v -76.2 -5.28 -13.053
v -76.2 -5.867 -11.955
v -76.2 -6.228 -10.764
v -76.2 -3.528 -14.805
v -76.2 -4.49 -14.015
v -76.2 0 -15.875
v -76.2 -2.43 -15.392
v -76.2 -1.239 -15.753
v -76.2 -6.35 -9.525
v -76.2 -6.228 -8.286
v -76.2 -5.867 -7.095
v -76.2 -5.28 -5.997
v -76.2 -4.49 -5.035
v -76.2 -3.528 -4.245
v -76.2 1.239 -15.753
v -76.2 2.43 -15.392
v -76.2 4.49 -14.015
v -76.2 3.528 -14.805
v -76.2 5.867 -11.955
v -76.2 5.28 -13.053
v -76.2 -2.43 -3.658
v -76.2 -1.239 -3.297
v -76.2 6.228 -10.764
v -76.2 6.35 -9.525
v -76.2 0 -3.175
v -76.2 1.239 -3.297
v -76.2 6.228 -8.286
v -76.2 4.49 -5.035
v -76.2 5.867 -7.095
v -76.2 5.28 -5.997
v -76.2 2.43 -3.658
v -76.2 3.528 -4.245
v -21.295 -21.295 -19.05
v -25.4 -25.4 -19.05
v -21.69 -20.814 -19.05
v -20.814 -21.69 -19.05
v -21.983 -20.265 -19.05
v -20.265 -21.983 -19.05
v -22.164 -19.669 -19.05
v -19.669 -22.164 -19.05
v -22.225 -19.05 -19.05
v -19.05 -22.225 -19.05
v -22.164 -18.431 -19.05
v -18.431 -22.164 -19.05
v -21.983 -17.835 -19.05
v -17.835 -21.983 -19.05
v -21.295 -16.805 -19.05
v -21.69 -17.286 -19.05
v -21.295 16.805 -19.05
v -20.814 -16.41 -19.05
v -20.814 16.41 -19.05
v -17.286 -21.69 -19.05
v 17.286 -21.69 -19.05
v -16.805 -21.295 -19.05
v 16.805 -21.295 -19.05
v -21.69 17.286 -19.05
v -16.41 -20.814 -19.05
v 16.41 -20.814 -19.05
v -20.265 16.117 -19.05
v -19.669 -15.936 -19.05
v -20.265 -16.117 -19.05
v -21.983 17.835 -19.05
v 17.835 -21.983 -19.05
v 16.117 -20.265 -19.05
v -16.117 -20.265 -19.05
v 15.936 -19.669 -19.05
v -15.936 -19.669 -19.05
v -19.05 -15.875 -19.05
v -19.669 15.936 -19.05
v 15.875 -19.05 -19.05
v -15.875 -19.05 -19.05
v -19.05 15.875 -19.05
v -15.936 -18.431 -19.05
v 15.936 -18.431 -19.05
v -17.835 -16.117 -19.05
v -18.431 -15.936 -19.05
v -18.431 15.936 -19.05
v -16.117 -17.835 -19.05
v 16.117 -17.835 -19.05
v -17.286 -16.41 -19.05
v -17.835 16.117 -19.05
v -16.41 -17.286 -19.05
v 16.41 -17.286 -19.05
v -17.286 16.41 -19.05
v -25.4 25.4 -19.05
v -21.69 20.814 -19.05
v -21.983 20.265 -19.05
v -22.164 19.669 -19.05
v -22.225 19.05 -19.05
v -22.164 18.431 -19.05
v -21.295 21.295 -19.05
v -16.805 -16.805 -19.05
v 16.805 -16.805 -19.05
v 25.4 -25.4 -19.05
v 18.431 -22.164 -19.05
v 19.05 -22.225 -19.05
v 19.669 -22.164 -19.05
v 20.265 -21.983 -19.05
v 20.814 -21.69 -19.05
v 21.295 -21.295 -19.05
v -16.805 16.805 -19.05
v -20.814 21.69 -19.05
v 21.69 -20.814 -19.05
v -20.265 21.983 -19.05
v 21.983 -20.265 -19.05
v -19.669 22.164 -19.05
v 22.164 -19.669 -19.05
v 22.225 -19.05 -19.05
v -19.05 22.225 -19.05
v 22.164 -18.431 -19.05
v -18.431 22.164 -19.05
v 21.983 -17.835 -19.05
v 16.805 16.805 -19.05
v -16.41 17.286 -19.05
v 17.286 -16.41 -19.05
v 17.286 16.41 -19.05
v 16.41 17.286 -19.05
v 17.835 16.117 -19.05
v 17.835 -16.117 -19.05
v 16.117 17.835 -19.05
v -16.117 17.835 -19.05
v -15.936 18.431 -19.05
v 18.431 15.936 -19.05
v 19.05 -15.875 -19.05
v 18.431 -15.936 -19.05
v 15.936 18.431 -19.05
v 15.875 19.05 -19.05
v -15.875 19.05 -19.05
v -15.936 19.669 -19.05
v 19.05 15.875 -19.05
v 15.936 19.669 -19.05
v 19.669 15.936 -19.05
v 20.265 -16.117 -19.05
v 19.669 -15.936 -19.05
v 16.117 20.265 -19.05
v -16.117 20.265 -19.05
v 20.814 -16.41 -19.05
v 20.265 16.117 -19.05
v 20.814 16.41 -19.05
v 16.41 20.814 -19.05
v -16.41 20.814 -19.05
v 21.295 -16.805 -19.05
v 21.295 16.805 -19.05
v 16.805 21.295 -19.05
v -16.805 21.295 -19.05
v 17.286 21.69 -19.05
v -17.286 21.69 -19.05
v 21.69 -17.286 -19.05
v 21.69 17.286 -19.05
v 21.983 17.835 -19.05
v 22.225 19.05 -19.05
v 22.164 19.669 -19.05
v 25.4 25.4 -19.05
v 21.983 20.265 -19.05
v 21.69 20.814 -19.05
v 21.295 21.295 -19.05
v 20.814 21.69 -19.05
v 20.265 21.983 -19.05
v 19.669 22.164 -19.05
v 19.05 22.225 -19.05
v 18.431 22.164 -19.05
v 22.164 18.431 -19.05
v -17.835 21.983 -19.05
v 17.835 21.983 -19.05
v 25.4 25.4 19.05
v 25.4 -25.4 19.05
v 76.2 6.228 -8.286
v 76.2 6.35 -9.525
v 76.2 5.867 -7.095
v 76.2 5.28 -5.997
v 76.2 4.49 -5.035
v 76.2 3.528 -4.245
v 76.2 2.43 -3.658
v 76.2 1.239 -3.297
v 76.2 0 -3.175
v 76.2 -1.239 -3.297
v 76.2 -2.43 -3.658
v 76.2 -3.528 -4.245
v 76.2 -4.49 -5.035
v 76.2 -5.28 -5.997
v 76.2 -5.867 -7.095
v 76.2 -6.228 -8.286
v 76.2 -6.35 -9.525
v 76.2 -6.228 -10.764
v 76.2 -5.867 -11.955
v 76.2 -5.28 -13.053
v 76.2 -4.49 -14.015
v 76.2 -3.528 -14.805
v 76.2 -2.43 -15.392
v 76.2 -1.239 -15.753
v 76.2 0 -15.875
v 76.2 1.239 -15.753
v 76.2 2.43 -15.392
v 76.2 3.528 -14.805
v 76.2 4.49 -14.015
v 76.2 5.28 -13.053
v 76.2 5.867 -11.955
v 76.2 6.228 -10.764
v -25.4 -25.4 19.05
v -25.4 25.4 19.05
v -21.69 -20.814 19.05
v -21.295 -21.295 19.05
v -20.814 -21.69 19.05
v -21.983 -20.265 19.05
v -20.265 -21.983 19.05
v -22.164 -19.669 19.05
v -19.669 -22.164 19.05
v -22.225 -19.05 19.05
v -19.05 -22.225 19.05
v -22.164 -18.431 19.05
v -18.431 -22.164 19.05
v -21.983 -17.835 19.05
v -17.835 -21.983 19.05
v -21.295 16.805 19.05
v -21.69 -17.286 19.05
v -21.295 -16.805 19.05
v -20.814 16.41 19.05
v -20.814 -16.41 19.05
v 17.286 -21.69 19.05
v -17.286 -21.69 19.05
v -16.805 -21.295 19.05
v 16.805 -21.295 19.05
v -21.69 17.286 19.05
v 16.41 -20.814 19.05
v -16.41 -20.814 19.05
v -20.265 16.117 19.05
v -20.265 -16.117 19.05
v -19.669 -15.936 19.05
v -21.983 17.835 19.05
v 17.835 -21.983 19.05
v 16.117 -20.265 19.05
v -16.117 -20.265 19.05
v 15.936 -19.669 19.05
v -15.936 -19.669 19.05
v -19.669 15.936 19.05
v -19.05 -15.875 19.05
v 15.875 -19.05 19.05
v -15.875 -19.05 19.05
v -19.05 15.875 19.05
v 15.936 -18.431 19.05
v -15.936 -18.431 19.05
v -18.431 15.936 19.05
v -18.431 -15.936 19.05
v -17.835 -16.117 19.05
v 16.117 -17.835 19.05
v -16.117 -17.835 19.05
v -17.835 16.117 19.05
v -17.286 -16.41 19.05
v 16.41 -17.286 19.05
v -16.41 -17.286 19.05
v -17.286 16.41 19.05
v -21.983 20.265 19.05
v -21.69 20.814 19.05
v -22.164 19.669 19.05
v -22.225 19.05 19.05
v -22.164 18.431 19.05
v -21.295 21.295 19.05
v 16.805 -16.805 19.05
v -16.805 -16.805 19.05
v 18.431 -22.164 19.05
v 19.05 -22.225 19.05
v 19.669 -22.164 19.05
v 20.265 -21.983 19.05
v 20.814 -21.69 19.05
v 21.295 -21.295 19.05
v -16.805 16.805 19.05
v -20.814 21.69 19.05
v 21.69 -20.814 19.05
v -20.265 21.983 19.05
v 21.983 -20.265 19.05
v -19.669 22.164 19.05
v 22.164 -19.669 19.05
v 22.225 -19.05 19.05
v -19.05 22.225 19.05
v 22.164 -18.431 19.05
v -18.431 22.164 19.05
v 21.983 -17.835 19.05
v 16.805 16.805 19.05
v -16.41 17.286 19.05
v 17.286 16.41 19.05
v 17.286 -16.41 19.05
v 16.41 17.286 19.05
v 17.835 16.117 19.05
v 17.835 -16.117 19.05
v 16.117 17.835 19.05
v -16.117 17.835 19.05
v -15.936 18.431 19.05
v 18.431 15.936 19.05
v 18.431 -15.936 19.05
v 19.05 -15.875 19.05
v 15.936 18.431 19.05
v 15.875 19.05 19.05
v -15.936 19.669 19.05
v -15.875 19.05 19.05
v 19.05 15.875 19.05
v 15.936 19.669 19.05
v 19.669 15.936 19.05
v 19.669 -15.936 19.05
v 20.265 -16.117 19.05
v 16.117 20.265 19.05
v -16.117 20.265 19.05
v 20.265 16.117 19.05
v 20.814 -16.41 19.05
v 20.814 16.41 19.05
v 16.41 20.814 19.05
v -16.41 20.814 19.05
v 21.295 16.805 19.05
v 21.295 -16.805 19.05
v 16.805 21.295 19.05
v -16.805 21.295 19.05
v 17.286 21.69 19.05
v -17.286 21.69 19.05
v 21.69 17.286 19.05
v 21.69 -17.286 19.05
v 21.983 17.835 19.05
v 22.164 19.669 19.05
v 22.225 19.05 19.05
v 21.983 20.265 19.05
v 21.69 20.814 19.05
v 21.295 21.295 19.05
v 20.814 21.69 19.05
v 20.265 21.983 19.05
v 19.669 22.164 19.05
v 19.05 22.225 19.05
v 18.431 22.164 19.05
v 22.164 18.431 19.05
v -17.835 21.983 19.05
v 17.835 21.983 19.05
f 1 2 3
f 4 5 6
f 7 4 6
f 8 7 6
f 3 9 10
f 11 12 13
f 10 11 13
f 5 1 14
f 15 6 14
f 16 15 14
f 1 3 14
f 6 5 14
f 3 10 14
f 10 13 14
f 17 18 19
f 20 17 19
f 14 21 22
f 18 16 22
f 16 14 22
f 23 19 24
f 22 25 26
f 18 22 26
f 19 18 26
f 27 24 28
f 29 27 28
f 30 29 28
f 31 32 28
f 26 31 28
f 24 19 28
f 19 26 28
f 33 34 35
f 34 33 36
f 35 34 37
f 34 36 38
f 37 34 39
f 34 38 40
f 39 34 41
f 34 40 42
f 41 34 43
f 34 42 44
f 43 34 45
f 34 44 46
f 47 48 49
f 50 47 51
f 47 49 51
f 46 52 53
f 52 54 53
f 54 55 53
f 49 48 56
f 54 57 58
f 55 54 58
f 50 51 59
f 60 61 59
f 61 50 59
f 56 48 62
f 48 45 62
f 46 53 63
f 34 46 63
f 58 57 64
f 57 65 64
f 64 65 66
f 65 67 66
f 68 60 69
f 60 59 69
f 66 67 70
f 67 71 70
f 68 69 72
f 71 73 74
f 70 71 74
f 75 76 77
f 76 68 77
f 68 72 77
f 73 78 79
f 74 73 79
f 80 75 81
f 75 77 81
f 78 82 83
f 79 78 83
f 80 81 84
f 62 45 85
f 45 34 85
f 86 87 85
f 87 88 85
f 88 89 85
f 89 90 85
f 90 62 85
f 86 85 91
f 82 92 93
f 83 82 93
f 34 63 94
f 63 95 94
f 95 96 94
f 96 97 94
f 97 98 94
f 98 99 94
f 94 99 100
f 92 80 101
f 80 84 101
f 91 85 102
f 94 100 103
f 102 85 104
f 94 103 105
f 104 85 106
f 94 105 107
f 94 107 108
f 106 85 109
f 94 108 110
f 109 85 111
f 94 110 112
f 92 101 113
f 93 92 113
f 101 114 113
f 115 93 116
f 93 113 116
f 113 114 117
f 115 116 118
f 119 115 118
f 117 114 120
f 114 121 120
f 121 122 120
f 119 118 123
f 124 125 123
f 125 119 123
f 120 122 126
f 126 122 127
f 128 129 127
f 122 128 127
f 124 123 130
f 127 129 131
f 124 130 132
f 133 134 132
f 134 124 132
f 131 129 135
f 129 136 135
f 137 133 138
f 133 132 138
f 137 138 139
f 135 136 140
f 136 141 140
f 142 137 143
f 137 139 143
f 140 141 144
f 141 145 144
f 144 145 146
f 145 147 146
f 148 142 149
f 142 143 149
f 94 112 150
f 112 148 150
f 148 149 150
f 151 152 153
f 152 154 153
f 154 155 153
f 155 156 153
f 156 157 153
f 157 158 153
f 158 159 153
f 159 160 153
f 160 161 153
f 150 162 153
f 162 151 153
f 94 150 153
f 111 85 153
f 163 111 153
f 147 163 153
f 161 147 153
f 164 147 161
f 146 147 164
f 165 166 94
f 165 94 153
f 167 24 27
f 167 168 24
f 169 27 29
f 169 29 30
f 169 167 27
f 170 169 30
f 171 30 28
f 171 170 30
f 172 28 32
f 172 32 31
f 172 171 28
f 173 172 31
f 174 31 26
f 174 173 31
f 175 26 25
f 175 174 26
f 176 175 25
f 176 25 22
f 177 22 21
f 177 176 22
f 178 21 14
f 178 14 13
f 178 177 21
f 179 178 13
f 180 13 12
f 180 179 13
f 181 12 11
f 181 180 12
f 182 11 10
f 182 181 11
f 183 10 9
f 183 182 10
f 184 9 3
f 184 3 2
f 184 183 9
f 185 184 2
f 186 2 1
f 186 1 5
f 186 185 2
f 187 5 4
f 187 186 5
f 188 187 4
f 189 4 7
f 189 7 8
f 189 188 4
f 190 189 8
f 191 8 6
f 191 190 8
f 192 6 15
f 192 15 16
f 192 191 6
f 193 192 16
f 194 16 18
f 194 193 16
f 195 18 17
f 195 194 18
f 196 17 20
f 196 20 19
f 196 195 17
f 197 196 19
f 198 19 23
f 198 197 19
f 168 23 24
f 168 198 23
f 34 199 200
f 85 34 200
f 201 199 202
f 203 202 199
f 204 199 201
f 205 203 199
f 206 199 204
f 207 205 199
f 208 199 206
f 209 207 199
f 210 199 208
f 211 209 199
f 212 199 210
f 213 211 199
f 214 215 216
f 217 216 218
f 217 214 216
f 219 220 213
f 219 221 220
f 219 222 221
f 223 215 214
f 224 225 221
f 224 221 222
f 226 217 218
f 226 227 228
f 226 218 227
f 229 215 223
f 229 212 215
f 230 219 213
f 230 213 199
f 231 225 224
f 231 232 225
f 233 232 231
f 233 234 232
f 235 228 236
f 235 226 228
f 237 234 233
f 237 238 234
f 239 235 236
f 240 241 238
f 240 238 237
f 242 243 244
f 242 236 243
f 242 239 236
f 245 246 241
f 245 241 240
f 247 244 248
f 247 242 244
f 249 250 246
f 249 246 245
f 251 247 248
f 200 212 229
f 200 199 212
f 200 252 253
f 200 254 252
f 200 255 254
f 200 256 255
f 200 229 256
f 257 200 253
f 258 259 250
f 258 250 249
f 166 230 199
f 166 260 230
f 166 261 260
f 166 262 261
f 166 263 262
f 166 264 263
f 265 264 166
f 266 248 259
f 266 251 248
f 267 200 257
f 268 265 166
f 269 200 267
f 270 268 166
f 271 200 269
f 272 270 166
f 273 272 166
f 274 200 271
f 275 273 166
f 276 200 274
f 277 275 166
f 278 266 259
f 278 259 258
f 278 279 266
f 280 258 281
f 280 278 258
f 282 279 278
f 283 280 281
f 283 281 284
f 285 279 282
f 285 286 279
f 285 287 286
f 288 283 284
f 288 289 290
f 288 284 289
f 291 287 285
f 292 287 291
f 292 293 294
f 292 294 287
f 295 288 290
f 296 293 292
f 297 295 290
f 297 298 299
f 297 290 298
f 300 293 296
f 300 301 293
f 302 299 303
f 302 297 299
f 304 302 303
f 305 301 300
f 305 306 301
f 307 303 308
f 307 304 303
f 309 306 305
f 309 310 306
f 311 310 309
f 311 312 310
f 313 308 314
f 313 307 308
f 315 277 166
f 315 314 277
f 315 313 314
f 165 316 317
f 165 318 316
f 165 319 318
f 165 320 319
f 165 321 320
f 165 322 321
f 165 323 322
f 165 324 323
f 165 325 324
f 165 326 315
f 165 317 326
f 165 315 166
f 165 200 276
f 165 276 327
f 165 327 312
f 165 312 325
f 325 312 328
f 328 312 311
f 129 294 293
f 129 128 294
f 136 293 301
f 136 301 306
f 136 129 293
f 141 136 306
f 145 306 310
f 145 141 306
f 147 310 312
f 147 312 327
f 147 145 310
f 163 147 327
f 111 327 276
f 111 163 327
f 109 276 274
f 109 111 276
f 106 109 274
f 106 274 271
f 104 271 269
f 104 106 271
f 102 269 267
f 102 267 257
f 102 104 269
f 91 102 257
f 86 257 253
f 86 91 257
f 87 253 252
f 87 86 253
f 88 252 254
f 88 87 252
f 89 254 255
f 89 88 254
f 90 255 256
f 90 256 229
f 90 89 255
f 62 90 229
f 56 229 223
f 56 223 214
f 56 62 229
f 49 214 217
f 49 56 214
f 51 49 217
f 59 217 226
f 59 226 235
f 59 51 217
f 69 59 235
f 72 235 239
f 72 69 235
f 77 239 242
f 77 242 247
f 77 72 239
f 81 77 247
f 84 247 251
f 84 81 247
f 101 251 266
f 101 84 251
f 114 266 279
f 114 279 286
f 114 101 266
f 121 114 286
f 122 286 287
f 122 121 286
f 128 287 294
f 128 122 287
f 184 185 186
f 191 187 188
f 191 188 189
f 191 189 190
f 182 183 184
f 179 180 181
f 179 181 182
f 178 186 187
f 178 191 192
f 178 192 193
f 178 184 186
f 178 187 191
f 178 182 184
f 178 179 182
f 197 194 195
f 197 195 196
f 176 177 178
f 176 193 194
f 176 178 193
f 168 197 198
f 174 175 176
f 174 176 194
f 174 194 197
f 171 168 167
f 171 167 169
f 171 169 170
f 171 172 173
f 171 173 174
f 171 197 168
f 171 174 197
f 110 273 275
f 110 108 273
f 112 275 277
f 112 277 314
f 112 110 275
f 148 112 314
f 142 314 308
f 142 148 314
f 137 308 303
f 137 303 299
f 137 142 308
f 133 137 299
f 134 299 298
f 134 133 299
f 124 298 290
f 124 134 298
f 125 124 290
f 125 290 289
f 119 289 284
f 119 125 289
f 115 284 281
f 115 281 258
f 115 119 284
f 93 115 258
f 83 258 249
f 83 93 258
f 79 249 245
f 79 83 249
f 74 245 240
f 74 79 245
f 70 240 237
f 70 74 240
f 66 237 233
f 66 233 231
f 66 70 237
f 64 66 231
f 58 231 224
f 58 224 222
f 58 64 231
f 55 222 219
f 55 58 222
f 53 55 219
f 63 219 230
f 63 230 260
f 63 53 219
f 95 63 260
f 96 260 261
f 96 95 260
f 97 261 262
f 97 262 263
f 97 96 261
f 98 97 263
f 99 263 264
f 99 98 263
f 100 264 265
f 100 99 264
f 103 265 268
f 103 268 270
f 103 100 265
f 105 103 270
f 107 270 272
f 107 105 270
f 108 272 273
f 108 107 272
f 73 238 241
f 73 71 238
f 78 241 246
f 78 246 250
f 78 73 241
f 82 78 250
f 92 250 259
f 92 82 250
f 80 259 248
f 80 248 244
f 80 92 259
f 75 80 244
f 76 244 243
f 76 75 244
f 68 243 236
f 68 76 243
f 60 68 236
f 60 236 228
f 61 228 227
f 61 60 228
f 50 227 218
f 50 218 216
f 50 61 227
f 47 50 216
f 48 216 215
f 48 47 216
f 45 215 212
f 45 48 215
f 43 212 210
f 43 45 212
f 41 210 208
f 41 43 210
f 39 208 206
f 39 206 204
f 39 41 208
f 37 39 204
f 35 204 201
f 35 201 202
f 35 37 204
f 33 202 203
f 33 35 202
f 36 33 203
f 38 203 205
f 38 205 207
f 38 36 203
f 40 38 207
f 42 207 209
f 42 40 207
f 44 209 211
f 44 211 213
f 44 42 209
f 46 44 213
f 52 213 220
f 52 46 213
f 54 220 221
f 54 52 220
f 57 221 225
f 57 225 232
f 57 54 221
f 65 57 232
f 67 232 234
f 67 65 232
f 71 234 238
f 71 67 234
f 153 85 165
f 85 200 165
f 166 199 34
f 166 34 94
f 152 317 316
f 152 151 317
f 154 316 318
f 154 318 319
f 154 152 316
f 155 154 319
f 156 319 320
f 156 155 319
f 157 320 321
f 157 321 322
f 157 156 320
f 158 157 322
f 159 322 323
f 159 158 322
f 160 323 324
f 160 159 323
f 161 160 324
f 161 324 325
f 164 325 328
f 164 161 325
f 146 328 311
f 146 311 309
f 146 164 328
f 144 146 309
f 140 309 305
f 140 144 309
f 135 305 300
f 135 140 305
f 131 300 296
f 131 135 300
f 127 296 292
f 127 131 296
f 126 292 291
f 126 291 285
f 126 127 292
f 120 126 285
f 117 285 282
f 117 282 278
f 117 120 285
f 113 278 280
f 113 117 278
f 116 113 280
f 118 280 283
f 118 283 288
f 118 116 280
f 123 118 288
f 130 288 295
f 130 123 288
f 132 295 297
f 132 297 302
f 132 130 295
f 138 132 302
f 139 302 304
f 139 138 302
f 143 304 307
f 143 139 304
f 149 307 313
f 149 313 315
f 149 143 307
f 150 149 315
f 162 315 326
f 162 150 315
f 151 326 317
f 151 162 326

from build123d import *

# Parameters (mm, degrees)
F0_W     = 50.8
F0_H     = 50.8
F0_R     = 3.175
F1_DEPTH = 19.05
F2_R     = 6.35
F3_DEPTH = 76.2


with BuildPart() as f1:
    # F0 (on Top) → F1 (new body, symmetric)
    with BuildSketch(Plane.XY):
        Rectangle(F0_W, F0_H)
        with Locations((-19.05, -19.05)):
            Circle(F0_R, mode=Mode.SUBTRACT)
        with Locations((19.05, -19.05)):
            Circle(F0_R, mode=Mode.SUBTRACT)
        with Locations((-19.05, 19.05)):
            Circle(F0_R, mode=Mode.SUBTRACT)
        with Locations((19.05, 19.05)):
            Circle(F0_R, mode=Mode.SUBTRACT)
    extrude(amount=F1_DEPTH, both=True)


with BuildPart() as f3:
    # F2 (on Right) → F3 (new body, symmetric)
    with BuildSketch(Plane.YZ):
        with Locations((0, -9.525)):
            Circle(F2_R)
    extrude(amount=F3_DEPTH, both=True)


solid = Compound([f1.part, f3.part])
